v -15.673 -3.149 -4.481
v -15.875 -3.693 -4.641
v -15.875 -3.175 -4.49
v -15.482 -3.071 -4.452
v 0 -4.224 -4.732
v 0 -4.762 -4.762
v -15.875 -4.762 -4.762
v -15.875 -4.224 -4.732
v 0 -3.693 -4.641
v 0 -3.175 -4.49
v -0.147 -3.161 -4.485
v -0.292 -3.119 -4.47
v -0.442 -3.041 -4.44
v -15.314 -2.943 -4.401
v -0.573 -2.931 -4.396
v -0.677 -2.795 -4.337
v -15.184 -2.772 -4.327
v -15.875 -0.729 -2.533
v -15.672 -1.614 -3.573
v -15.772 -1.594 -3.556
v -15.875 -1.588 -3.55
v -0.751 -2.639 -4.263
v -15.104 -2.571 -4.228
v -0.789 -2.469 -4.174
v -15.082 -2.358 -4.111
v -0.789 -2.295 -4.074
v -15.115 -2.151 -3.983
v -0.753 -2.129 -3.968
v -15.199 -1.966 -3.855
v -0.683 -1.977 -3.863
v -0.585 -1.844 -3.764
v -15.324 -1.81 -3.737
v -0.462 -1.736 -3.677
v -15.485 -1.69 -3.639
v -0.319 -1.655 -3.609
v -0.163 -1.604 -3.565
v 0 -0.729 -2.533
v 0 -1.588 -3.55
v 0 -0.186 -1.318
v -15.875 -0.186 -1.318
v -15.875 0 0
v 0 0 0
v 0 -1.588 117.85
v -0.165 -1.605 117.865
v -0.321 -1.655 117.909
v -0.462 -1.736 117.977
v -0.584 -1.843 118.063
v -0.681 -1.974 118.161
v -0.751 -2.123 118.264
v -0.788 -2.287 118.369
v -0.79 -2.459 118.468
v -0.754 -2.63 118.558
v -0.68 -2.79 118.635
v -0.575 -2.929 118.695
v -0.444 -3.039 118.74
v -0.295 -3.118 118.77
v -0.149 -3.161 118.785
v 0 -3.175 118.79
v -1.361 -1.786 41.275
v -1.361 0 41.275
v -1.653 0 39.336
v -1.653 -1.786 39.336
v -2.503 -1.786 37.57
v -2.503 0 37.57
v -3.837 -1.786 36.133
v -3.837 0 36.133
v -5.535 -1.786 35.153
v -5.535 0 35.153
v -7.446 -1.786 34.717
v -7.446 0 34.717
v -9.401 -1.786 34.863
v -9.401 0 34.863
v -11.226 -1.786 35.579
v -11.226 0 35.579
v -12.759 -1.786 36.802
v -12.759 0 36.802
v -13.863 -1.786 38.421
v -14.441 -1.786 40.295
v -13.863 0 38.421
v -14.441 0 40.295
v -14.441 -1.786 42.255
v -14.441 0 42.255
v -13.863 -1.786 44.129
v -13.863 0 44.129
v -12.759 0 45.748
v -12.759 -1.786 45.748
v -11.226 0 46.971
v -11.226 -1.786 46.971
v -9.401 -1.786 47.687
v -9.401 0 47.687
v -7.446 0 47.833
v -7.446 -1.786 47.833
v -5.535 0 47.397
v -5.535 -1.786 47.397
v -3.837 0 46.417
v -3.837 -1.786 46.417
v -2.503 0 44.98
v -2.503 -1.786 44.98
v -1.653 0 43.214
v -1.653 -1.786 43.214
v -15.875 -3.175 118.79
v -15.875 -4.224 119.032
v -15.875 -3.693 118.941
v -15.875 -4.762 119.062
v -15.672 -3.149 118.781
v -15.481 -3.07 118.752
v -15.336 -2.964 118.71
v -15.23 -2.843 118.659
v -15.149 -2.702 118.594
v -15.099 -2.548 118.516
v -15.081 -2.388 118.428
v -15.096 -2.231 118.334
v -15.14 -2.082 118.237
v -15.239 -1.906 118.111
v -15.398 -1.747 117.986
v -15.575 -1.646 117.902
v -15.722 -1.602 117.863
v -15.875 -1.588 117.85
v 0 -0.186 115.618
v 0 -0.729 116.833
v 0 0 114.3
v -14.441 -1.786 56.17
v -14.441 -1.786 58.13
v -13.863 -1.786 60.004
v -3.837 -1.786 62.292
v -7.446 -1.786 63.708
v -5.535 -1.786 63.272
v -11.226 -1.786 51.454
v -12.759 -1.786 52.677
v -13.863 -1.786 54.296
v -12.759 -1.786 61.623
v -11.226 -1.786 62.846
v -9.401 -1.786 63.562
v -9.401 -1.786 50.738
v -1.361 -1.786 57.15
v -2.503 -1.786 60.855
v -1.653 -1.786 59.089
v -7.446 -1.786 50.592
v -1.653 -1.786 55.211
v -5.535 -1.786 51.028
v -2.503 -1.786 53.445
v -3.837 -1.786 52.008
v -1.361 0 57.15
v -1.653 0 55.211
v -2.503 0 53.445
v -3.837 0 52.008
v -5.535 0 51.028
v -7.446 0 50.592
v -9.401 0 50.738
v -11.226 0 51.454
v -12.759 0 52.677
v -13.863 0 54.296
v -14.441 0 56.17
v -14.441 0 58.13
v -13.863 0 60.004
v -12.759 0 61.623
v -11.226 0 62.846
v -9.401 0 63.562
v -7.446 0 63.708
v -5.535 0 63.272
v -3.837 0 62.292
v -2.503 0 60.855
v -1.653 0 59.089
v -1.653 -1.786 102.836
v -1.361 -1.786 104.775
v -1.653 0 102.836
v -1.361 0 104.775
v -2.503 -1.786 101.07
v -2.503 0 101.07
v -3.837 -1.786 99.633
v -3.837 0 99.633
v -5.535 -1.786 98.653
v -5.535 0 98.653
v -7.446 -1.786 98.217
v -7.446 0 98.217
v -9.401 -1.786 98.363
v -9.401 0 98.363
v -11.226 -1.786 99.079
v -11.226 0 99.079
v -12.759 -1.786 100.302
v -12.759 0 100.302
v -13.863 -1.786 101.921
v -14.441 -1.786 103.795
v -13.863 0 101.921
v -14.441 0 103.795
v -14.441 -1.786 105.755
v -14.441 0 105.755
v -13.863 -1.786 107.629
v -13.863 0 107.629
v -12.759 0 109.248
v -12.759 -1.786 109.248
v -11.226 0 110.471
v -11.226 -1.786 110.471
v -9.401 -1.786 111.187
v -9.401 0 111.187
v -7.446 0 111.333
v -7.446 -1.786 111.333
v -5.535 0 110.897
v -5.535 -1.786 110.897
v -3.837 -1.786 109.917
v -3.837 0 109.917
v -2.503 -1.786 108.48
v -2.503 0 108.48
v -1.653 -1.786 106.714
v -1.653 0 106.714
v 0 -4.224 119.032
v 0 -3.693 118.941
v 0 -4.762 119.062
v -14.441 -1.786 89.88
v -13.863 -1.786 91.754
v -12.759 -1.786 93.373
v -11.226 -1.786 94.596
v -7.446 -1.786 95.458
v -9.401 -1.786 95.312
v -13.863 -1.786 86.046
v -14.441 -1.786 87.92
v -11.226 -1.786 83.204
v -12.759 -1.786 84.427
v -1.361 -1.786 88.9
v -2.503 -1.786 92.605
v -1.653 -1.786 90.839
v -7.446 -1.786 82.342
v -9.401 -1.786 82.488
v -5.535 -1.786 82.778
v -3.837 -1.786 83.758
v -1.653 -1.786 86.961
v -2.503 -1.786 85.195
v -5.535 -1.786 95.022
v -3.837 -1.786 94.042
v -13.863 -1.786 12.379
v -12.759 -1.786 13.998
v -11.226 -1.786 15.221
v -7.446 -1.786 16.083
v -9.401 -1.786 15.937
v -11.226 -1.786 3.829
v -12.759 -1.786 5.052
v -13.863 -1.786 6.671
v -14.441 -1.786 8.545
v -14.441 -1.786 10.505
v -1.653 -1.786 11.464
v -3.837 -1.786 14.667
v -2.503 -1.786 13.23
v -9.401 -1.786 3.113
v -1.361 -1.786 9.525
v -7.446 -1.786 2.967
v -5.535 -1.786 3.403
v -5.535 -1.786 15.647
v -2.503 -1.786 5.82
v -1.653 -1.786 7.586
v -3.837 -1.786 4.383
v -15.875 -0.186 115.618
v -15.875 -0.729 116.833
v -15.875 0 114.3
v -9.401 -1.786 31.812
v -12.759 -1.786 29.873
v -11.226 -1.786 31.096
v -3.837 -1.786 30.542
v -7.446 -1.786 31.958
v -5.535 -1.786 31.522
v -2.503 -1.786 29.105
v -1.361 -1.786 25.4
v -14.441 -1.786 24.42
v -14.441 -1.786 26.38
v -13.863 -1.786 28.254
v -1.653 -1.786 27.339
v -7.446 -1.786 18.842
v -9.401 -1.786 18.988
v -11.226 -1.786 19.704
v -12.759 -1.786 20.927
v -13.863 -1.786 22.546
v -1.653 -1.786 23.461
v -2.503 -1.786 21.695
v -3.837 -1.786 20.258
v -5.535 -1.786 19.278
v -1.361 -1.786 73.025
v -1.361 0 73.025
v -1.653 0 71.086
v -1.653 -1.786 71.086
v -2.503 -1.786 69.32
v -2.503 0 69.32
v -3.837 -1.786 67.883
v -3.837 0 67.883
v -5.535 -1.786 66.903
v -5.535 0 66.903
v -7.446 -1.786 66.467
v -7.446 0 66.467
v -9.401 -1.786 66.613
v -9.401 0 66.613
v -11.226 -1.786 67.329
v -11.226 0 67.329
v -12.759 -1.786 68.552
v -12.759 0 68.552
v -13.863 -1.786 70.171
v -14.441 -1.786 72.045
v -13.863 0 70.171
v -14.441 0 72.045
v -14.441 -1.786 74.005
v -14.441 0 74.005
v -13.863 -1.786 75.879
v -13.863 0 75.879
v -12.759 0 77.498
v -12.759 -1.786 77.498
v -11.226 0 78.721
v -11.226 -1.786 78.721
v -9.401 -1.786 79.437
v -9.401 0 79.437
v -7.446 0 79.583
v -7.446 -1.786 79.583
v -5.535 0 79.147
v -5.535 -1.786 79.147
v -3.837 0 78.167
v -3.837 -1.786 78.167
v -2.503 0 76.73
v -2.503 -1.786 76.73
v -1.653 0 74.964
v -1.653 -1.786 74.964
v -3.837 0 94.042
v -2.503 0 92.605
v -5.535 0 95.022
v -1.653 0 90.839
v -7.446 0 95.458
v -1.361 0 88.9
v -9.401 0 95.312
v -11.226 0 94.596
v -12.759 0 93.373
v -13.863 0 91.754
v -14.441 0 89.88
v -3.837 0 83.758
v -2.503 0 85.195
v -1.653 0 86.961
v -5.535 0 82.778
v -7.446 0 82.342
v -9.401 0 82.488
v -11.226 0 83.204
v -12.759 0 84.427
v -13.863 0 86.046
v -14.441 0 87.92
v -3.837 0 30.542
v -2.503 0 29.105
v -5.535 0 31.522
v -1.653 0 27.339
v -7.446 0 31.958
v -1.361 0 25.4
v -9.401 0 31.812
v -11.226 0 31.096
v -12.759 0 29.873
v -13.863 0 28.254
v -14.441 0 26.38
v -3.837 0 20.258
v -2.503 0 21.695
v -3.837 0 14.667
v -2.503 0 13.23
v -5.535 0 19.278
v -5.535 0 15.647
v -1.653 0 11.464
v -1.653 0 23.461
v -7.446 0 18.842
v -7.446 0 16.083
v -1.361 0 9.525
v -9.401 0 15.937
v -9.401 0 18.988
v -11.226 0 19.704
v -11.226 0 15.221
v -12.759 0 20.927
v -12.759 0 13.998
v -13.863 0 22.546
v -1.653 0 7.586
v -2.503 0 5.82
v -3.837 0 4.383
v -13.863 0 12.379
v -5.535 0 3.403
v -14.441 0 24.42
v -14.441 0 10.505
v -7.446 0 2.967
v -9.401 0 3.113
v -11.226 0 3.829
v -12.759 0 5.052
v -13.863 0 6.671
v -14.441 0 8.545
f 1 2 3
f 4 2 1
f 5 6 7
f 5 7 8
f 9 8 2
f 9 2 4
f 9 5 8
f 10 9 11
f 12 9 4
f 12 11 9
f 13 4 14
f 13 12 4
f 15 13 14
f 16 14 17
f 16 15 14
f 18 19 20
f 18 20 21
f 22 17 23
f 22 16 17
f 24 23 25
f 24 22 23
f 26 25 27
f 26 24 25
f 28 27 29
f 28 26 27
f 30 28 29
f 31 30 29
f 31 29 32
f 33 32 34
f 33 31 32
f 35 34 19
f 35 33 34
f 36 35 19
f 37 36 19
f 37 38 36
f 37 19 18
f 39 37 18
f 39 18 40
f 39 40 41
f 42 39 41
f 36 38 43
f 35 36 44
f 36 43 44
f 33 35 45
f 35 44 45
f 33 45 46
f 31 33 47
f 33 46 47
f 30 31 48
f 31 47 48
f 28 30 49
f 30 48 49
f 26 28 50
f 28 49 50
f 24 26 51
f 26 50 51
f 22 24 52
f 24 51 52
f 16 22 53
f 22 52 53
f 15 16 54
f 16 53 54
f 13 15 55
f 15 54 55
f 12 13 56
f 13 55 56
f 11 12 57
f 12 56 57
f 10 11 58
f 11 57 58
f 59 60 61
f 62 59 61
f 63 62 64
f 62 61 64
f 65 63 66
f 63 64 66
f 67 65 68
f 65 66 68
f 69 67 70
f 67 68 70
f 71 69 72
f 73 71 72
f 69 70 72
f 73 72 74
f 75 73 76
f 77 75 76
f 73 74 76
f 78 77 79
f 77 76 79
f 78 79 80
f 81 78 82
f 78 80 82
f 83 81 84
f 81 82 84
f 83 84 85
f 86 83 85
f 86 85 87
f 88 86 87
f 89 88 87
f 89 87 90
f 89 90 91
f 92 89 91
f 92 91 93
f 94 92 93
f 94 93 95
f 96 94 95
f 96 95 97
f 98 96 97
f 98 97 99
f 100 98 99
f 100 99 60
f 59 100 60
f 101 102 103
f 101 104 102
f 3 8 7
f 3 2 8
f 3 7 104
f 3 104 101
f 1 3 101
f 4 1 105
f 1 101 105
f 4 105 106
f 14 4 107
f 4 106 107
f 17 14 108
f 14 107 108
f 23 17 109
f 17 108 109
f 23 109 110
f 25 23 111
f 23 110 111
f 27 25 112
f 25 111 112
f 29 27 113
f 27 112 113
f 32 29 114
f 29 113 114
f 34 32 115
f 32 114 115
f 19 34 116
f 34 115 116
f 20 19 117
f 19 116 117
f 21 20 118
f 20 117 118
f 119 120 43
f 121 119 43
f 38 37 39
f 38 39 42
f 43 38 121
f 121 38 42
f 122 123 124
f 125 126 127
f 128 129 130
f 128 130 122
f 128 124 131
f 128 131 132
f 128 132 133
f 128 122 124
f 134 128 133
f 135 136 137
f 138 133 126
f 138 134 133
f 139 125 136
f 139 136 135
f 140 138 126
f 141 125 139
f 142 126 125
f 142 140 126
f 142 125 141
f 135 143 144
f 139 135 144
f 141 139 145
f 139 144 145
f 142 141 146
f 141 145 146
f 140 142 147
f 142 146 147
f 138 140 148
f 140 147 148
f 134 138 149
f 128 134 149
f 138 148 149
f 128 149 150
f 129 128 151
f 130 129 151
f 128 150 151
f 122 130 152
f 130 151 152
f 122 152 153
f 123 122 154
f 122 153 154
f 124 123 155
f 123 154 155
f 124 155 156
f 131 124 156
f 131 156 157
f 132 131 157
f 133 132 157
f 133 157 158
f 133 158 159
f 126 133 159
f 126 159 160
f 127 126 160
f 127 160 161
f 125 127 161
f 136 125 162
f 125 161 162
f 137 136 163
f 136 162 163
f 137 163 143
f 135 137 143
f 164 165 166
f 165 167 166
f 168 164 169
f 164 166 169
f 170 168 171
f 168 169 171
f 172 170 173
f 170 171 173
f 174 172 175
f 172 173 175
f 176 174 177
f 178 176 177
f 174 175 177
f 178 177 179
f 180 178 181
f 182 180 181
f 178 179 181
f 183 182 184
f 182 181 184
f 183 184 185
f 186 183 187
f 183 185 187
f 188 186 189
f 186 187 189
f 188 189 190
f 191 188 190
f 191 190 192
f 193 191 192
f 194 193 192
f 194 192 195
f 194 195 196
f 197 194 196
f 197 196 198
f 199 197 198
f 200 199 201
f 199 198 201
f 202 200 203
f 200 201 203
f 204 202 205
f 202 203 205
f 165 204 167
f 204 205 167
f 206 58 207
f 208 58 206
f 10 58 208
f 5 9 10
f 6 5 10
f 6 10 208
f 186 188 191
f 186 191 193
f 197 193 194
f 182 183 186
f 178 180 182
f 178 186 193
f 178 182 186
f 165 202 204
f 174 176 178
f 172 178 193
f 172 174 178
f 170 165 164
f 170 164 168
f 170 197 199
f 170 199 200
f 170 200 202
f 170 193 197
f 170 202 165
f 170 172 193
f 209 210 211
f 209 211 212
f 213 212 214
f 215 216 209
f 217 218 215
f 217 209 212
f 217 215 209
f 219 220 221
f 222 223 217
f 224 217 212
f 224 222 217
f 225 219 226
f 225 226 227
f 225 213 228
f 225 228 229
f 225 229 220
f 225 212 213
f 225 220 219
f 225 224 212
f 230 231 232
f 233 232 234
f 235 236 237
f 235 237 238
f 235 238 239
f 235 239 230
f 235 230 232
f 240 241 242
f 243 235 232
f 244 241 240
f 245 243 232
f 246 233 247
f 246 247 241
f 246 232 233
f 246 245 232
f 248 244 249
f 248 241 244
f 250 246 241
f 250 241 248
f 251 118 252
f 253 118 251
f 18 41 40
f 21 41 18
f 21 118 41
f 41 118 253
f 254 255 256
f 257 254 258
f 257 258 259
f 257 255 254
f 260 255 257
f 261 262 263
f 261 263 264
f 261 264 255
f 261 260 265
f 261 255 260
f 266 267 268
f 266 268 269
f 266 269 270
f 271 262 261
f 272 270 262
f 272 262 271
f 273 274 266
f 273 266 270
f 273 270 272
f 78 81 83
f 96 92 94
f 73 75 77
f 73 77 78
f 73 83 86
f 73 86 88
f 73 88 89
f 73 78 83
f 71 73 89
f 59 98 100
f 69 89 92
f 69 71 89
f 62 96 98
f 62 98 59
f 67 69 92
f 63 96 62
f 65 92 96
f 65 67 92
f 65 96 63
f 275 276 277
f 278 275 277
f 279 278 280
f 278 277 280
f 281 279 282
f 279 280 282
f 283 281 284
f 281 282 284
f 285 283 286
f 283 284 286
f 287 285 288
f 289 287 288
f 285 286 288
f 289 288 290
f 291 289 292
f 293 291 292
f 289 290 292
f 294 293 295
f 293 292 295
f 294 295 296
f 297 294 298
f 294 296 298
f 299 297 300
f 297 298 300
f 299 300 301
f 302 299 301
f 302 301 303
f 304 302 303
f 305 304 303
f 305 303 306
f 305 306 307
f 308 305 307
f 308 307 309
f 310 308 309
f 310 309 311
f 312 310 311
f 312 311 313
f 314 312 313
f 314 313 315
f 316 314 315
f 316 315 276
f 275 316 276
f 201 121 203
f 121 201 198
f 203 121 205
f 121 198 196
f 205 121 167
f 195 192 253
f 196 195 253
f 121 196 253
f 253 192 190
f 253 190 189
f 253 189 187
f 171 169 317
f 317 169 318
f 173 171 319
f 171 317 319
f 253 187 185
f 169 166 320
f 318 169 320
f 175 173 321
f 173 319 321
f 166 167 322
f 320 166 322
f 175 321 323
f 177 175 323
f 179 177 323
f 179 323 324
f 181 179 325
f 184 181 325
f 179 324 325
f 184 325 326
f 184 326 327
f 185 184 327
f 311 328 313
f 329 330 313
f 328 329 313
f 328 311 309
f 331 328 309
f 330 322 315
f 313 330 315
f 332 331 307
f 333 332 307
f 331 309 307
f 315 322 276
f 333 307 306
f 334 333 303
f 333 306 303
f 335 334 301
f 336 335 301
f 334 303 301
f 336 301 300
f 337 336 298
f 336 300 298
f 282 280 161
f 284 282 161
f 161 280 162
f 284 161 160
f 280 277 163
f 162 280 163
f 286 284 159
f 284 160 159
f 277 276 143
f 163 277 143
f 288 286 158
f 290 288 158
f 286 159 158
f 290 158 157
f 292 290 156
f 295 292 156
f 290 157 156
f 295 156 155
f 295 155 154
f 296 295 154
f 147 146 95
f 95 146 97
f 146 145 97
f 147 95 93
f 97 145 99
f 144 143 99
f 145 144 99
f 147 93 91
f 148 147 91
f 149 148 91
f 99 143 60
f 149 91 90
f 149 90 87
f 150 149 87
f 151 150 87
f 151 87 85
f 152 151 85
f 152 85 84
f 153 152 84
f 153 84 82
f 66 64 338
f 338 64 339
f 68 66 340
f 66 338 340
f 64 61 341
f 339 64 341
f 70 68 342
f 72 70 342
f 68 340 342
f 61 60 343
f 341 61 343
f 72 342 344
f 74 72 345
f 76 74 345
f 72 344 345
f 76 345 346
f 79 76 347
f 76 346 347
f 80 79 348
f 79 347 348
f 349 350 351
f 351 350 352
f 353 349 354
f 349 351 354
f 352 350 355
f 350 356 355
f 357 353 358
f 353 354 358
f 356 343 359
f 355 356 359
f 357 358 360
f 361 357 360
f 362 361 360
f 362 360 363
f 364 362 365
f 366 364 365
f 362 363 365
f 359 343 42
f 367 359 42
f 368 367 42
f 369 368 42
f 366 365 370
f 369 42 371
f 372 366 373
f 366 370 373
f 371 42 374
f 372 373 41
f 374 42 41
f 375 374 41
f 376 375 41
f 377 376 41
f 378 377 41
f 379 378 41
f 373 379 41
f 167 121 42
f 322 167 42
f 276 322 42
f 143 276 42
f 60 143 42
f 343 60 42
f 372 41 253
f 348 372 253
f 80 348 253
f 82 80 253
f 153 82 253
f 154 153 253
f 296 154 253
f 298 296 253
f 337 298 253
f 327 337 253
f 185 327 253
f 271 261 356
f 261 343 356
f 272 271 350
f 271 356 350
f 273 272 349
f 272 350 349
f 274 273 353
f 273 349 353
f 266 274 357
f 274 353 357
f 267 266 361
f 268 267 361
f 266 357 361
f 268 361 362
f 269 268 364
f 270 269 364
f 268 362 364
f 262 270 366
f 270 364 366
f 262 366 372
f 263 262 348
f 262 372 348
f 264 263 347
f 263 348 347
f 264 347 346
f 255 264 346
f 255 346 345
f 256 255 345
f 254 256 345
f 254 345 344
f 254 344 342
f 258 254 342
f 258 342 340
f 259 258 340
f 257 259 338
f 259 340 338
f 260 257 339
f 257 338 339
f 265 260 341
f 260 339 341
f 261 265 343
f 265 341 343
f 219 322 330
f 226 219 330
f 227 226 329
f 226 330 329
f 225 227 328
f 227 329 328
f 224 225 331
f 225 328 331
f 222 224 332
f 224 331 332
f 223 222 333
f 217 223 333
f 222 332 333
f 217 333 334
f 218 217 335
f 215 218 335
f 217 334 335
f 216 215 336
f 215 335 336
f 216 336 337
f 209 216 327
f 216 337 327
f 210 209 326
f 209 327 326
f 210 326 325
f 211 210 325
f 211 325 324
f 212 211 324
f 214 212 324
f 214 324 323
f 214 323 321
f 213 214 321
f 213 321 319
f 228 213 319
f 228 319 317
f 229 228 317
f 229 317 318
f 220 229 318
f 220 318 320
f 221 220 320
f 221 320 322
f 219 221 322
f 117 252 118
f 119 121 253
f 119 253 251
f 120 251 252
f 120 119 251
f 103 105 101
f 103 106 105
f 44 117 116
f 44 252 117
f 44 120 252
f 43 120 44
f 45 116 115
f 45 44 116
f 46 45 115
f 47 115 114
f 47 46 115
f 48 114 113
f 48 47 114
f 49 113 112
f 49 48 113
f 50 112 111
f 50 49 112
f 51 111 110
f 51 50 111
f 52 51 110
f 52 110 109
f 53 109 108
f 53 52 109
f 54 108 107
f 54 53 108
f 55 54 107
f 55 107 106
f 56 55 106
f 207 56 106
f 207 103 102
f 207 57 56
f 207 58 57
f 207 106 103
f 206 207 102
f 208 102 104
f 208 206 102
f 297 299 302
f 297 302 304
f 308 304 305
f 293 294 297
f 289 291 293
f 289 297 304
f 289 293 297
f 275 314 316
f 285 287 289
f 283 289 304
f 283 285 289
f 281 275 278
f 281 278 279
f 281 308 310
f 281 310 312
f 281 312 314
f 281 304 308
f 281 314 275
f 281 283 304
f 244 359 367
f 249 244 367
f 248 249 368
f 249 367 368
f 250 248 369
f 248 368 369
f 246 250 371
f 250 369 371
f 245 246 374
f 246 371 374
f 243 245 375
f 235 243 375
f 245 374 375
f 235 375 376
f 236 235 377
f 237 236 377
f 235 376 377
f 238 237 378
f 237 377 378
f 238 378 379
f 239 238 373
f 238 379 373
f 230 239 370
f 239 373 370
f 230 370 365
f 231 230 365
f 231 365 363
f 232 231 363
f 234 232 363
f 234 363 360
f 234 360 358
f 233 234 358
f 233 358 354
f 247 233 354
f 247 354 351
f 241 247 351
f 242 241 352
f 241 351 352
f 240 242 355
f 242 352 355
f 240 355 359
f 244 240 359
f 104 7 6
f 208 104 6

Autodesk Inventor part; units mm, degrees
ref_plane "YZ Plane" through (0, 0, 0) normal (1, 0, 0) x (0, 1, 0)
ref_plane "XZ Plane" through (0, 0, 0) normal (0, 1, 0) x (-1, 0, 0)
ref_plane "XY Plane" through (0, 0, 0) normal (0, 0, 1) x (1, 0, 0)
sketch "Sketch16" plane through (0, 0, 0) normal (0, 0, 1) x (1, 0, 0)
  line L0 (0, 0) -> (-15.875, 0)
  line L1 (-15.875, -4.7625) -> (0, -4.7625)
  line L2 (0, 0) -> (0, -4.7625)
  line L3 (-15.875, -4.7625) -> (-15.875, 0)
  dimension "d96" = 15.875
  dimension "d184" = 4.7625
extrude "Extrusion17" add sketch "Sketch16" along normal blind 114.3
sketch "Sketch17" plane through (-15.875, 0, 0) normal (0, 1, 0) x (1, 0, 0)
  circle A0 centre (7.9375, -104.775) radius 6.5768
  line L0 (0, 0) -> (0, -114.3) projected
  line L1 (15.875, -114.3) -> (0, -114.3) projected
  circle A1 centre (7.9375, -88.9) radius 6.5768
  circle A2 centre (7.9375, -73.025) radius 6.5768
  circle A3 centre (7.9375, -57.15) radius 6.5768
  circle A4 centre (7.9375, -41.275) radius 6.5768
  circle A5 centre (7.9375, -25.4) radius 6.5768
  circle A6 centre (7.9375, -9.525) radius 6.5768
  point P0 (15.875, 0)
  dimension "d102" = 13.1536
  dimension "d103" = 7.9375
  dimension "d104" = 9.525
  dimension "d107" = 15.875
sketch "Sketch44" plane through (0, -4.7625, 0) normal (1, 0, 0) x (0, 0, -1)
  arc A0 (4.7625, 0) -> (0, 4.7625) centre (0, 0) ccw
  line L0 (0, 0) -> (4.7625, 0)
  line L1 (0, 4.7625) -> (0, 0)
  arc A1 (-114.3, 4.7625) -> (-119.0625, 0) centre (-114.3, 0) ccw
  line L2 (-114.3, 4.7625) -> (-114.3, 0)
  line L3 (-114.3, 0) -> (-119.0625, 0)
extrude "Extrusion40" add sketch "Sketch44" against normal up to surface (15.875 mm away)
ref_plane "Work Plane1" through (0, -4.7625, 119.0625) normal (0, 0, 1) x (1, 0, 0)
sketch "Sketch45" plane through (0, -4.7625, 119.0625) normal (0, 0, 1) x (1, 0, 0)
  line L0 (-15.875, 0) -> (-15.875, 4.7625) projected
  arc A0 (-15.875, 1.5875) -> (-15.875, 3.175) centre (-15.875, 2.3812) ccw
  line L1 (0, 4.7625) -> (0, 0) projected
  arc A1 (0, 3.175) -> (0, 1.5875) centre (0, 2.3813) ccw
  line L2 (-15.875, 3.175) -> (-15.875, 1.5875)
  line L3 (0, 3.175) -> (0, 1.5875)
  line L4 (0, 4.7625) -> (-15.875, 4.7625) projected
  dimension "d240" = 0.7937
  dimension "d241" = 0.7937
  dimension "d242" = 2.3813
  dimension "d243" = 2.3813
extrude "Extrusion41" cut sketch "Sketch45" against normal through all
extrude "Extrusion42" cut sketch "Sketch17" against normal blind 1.7859
properties part number "base"
